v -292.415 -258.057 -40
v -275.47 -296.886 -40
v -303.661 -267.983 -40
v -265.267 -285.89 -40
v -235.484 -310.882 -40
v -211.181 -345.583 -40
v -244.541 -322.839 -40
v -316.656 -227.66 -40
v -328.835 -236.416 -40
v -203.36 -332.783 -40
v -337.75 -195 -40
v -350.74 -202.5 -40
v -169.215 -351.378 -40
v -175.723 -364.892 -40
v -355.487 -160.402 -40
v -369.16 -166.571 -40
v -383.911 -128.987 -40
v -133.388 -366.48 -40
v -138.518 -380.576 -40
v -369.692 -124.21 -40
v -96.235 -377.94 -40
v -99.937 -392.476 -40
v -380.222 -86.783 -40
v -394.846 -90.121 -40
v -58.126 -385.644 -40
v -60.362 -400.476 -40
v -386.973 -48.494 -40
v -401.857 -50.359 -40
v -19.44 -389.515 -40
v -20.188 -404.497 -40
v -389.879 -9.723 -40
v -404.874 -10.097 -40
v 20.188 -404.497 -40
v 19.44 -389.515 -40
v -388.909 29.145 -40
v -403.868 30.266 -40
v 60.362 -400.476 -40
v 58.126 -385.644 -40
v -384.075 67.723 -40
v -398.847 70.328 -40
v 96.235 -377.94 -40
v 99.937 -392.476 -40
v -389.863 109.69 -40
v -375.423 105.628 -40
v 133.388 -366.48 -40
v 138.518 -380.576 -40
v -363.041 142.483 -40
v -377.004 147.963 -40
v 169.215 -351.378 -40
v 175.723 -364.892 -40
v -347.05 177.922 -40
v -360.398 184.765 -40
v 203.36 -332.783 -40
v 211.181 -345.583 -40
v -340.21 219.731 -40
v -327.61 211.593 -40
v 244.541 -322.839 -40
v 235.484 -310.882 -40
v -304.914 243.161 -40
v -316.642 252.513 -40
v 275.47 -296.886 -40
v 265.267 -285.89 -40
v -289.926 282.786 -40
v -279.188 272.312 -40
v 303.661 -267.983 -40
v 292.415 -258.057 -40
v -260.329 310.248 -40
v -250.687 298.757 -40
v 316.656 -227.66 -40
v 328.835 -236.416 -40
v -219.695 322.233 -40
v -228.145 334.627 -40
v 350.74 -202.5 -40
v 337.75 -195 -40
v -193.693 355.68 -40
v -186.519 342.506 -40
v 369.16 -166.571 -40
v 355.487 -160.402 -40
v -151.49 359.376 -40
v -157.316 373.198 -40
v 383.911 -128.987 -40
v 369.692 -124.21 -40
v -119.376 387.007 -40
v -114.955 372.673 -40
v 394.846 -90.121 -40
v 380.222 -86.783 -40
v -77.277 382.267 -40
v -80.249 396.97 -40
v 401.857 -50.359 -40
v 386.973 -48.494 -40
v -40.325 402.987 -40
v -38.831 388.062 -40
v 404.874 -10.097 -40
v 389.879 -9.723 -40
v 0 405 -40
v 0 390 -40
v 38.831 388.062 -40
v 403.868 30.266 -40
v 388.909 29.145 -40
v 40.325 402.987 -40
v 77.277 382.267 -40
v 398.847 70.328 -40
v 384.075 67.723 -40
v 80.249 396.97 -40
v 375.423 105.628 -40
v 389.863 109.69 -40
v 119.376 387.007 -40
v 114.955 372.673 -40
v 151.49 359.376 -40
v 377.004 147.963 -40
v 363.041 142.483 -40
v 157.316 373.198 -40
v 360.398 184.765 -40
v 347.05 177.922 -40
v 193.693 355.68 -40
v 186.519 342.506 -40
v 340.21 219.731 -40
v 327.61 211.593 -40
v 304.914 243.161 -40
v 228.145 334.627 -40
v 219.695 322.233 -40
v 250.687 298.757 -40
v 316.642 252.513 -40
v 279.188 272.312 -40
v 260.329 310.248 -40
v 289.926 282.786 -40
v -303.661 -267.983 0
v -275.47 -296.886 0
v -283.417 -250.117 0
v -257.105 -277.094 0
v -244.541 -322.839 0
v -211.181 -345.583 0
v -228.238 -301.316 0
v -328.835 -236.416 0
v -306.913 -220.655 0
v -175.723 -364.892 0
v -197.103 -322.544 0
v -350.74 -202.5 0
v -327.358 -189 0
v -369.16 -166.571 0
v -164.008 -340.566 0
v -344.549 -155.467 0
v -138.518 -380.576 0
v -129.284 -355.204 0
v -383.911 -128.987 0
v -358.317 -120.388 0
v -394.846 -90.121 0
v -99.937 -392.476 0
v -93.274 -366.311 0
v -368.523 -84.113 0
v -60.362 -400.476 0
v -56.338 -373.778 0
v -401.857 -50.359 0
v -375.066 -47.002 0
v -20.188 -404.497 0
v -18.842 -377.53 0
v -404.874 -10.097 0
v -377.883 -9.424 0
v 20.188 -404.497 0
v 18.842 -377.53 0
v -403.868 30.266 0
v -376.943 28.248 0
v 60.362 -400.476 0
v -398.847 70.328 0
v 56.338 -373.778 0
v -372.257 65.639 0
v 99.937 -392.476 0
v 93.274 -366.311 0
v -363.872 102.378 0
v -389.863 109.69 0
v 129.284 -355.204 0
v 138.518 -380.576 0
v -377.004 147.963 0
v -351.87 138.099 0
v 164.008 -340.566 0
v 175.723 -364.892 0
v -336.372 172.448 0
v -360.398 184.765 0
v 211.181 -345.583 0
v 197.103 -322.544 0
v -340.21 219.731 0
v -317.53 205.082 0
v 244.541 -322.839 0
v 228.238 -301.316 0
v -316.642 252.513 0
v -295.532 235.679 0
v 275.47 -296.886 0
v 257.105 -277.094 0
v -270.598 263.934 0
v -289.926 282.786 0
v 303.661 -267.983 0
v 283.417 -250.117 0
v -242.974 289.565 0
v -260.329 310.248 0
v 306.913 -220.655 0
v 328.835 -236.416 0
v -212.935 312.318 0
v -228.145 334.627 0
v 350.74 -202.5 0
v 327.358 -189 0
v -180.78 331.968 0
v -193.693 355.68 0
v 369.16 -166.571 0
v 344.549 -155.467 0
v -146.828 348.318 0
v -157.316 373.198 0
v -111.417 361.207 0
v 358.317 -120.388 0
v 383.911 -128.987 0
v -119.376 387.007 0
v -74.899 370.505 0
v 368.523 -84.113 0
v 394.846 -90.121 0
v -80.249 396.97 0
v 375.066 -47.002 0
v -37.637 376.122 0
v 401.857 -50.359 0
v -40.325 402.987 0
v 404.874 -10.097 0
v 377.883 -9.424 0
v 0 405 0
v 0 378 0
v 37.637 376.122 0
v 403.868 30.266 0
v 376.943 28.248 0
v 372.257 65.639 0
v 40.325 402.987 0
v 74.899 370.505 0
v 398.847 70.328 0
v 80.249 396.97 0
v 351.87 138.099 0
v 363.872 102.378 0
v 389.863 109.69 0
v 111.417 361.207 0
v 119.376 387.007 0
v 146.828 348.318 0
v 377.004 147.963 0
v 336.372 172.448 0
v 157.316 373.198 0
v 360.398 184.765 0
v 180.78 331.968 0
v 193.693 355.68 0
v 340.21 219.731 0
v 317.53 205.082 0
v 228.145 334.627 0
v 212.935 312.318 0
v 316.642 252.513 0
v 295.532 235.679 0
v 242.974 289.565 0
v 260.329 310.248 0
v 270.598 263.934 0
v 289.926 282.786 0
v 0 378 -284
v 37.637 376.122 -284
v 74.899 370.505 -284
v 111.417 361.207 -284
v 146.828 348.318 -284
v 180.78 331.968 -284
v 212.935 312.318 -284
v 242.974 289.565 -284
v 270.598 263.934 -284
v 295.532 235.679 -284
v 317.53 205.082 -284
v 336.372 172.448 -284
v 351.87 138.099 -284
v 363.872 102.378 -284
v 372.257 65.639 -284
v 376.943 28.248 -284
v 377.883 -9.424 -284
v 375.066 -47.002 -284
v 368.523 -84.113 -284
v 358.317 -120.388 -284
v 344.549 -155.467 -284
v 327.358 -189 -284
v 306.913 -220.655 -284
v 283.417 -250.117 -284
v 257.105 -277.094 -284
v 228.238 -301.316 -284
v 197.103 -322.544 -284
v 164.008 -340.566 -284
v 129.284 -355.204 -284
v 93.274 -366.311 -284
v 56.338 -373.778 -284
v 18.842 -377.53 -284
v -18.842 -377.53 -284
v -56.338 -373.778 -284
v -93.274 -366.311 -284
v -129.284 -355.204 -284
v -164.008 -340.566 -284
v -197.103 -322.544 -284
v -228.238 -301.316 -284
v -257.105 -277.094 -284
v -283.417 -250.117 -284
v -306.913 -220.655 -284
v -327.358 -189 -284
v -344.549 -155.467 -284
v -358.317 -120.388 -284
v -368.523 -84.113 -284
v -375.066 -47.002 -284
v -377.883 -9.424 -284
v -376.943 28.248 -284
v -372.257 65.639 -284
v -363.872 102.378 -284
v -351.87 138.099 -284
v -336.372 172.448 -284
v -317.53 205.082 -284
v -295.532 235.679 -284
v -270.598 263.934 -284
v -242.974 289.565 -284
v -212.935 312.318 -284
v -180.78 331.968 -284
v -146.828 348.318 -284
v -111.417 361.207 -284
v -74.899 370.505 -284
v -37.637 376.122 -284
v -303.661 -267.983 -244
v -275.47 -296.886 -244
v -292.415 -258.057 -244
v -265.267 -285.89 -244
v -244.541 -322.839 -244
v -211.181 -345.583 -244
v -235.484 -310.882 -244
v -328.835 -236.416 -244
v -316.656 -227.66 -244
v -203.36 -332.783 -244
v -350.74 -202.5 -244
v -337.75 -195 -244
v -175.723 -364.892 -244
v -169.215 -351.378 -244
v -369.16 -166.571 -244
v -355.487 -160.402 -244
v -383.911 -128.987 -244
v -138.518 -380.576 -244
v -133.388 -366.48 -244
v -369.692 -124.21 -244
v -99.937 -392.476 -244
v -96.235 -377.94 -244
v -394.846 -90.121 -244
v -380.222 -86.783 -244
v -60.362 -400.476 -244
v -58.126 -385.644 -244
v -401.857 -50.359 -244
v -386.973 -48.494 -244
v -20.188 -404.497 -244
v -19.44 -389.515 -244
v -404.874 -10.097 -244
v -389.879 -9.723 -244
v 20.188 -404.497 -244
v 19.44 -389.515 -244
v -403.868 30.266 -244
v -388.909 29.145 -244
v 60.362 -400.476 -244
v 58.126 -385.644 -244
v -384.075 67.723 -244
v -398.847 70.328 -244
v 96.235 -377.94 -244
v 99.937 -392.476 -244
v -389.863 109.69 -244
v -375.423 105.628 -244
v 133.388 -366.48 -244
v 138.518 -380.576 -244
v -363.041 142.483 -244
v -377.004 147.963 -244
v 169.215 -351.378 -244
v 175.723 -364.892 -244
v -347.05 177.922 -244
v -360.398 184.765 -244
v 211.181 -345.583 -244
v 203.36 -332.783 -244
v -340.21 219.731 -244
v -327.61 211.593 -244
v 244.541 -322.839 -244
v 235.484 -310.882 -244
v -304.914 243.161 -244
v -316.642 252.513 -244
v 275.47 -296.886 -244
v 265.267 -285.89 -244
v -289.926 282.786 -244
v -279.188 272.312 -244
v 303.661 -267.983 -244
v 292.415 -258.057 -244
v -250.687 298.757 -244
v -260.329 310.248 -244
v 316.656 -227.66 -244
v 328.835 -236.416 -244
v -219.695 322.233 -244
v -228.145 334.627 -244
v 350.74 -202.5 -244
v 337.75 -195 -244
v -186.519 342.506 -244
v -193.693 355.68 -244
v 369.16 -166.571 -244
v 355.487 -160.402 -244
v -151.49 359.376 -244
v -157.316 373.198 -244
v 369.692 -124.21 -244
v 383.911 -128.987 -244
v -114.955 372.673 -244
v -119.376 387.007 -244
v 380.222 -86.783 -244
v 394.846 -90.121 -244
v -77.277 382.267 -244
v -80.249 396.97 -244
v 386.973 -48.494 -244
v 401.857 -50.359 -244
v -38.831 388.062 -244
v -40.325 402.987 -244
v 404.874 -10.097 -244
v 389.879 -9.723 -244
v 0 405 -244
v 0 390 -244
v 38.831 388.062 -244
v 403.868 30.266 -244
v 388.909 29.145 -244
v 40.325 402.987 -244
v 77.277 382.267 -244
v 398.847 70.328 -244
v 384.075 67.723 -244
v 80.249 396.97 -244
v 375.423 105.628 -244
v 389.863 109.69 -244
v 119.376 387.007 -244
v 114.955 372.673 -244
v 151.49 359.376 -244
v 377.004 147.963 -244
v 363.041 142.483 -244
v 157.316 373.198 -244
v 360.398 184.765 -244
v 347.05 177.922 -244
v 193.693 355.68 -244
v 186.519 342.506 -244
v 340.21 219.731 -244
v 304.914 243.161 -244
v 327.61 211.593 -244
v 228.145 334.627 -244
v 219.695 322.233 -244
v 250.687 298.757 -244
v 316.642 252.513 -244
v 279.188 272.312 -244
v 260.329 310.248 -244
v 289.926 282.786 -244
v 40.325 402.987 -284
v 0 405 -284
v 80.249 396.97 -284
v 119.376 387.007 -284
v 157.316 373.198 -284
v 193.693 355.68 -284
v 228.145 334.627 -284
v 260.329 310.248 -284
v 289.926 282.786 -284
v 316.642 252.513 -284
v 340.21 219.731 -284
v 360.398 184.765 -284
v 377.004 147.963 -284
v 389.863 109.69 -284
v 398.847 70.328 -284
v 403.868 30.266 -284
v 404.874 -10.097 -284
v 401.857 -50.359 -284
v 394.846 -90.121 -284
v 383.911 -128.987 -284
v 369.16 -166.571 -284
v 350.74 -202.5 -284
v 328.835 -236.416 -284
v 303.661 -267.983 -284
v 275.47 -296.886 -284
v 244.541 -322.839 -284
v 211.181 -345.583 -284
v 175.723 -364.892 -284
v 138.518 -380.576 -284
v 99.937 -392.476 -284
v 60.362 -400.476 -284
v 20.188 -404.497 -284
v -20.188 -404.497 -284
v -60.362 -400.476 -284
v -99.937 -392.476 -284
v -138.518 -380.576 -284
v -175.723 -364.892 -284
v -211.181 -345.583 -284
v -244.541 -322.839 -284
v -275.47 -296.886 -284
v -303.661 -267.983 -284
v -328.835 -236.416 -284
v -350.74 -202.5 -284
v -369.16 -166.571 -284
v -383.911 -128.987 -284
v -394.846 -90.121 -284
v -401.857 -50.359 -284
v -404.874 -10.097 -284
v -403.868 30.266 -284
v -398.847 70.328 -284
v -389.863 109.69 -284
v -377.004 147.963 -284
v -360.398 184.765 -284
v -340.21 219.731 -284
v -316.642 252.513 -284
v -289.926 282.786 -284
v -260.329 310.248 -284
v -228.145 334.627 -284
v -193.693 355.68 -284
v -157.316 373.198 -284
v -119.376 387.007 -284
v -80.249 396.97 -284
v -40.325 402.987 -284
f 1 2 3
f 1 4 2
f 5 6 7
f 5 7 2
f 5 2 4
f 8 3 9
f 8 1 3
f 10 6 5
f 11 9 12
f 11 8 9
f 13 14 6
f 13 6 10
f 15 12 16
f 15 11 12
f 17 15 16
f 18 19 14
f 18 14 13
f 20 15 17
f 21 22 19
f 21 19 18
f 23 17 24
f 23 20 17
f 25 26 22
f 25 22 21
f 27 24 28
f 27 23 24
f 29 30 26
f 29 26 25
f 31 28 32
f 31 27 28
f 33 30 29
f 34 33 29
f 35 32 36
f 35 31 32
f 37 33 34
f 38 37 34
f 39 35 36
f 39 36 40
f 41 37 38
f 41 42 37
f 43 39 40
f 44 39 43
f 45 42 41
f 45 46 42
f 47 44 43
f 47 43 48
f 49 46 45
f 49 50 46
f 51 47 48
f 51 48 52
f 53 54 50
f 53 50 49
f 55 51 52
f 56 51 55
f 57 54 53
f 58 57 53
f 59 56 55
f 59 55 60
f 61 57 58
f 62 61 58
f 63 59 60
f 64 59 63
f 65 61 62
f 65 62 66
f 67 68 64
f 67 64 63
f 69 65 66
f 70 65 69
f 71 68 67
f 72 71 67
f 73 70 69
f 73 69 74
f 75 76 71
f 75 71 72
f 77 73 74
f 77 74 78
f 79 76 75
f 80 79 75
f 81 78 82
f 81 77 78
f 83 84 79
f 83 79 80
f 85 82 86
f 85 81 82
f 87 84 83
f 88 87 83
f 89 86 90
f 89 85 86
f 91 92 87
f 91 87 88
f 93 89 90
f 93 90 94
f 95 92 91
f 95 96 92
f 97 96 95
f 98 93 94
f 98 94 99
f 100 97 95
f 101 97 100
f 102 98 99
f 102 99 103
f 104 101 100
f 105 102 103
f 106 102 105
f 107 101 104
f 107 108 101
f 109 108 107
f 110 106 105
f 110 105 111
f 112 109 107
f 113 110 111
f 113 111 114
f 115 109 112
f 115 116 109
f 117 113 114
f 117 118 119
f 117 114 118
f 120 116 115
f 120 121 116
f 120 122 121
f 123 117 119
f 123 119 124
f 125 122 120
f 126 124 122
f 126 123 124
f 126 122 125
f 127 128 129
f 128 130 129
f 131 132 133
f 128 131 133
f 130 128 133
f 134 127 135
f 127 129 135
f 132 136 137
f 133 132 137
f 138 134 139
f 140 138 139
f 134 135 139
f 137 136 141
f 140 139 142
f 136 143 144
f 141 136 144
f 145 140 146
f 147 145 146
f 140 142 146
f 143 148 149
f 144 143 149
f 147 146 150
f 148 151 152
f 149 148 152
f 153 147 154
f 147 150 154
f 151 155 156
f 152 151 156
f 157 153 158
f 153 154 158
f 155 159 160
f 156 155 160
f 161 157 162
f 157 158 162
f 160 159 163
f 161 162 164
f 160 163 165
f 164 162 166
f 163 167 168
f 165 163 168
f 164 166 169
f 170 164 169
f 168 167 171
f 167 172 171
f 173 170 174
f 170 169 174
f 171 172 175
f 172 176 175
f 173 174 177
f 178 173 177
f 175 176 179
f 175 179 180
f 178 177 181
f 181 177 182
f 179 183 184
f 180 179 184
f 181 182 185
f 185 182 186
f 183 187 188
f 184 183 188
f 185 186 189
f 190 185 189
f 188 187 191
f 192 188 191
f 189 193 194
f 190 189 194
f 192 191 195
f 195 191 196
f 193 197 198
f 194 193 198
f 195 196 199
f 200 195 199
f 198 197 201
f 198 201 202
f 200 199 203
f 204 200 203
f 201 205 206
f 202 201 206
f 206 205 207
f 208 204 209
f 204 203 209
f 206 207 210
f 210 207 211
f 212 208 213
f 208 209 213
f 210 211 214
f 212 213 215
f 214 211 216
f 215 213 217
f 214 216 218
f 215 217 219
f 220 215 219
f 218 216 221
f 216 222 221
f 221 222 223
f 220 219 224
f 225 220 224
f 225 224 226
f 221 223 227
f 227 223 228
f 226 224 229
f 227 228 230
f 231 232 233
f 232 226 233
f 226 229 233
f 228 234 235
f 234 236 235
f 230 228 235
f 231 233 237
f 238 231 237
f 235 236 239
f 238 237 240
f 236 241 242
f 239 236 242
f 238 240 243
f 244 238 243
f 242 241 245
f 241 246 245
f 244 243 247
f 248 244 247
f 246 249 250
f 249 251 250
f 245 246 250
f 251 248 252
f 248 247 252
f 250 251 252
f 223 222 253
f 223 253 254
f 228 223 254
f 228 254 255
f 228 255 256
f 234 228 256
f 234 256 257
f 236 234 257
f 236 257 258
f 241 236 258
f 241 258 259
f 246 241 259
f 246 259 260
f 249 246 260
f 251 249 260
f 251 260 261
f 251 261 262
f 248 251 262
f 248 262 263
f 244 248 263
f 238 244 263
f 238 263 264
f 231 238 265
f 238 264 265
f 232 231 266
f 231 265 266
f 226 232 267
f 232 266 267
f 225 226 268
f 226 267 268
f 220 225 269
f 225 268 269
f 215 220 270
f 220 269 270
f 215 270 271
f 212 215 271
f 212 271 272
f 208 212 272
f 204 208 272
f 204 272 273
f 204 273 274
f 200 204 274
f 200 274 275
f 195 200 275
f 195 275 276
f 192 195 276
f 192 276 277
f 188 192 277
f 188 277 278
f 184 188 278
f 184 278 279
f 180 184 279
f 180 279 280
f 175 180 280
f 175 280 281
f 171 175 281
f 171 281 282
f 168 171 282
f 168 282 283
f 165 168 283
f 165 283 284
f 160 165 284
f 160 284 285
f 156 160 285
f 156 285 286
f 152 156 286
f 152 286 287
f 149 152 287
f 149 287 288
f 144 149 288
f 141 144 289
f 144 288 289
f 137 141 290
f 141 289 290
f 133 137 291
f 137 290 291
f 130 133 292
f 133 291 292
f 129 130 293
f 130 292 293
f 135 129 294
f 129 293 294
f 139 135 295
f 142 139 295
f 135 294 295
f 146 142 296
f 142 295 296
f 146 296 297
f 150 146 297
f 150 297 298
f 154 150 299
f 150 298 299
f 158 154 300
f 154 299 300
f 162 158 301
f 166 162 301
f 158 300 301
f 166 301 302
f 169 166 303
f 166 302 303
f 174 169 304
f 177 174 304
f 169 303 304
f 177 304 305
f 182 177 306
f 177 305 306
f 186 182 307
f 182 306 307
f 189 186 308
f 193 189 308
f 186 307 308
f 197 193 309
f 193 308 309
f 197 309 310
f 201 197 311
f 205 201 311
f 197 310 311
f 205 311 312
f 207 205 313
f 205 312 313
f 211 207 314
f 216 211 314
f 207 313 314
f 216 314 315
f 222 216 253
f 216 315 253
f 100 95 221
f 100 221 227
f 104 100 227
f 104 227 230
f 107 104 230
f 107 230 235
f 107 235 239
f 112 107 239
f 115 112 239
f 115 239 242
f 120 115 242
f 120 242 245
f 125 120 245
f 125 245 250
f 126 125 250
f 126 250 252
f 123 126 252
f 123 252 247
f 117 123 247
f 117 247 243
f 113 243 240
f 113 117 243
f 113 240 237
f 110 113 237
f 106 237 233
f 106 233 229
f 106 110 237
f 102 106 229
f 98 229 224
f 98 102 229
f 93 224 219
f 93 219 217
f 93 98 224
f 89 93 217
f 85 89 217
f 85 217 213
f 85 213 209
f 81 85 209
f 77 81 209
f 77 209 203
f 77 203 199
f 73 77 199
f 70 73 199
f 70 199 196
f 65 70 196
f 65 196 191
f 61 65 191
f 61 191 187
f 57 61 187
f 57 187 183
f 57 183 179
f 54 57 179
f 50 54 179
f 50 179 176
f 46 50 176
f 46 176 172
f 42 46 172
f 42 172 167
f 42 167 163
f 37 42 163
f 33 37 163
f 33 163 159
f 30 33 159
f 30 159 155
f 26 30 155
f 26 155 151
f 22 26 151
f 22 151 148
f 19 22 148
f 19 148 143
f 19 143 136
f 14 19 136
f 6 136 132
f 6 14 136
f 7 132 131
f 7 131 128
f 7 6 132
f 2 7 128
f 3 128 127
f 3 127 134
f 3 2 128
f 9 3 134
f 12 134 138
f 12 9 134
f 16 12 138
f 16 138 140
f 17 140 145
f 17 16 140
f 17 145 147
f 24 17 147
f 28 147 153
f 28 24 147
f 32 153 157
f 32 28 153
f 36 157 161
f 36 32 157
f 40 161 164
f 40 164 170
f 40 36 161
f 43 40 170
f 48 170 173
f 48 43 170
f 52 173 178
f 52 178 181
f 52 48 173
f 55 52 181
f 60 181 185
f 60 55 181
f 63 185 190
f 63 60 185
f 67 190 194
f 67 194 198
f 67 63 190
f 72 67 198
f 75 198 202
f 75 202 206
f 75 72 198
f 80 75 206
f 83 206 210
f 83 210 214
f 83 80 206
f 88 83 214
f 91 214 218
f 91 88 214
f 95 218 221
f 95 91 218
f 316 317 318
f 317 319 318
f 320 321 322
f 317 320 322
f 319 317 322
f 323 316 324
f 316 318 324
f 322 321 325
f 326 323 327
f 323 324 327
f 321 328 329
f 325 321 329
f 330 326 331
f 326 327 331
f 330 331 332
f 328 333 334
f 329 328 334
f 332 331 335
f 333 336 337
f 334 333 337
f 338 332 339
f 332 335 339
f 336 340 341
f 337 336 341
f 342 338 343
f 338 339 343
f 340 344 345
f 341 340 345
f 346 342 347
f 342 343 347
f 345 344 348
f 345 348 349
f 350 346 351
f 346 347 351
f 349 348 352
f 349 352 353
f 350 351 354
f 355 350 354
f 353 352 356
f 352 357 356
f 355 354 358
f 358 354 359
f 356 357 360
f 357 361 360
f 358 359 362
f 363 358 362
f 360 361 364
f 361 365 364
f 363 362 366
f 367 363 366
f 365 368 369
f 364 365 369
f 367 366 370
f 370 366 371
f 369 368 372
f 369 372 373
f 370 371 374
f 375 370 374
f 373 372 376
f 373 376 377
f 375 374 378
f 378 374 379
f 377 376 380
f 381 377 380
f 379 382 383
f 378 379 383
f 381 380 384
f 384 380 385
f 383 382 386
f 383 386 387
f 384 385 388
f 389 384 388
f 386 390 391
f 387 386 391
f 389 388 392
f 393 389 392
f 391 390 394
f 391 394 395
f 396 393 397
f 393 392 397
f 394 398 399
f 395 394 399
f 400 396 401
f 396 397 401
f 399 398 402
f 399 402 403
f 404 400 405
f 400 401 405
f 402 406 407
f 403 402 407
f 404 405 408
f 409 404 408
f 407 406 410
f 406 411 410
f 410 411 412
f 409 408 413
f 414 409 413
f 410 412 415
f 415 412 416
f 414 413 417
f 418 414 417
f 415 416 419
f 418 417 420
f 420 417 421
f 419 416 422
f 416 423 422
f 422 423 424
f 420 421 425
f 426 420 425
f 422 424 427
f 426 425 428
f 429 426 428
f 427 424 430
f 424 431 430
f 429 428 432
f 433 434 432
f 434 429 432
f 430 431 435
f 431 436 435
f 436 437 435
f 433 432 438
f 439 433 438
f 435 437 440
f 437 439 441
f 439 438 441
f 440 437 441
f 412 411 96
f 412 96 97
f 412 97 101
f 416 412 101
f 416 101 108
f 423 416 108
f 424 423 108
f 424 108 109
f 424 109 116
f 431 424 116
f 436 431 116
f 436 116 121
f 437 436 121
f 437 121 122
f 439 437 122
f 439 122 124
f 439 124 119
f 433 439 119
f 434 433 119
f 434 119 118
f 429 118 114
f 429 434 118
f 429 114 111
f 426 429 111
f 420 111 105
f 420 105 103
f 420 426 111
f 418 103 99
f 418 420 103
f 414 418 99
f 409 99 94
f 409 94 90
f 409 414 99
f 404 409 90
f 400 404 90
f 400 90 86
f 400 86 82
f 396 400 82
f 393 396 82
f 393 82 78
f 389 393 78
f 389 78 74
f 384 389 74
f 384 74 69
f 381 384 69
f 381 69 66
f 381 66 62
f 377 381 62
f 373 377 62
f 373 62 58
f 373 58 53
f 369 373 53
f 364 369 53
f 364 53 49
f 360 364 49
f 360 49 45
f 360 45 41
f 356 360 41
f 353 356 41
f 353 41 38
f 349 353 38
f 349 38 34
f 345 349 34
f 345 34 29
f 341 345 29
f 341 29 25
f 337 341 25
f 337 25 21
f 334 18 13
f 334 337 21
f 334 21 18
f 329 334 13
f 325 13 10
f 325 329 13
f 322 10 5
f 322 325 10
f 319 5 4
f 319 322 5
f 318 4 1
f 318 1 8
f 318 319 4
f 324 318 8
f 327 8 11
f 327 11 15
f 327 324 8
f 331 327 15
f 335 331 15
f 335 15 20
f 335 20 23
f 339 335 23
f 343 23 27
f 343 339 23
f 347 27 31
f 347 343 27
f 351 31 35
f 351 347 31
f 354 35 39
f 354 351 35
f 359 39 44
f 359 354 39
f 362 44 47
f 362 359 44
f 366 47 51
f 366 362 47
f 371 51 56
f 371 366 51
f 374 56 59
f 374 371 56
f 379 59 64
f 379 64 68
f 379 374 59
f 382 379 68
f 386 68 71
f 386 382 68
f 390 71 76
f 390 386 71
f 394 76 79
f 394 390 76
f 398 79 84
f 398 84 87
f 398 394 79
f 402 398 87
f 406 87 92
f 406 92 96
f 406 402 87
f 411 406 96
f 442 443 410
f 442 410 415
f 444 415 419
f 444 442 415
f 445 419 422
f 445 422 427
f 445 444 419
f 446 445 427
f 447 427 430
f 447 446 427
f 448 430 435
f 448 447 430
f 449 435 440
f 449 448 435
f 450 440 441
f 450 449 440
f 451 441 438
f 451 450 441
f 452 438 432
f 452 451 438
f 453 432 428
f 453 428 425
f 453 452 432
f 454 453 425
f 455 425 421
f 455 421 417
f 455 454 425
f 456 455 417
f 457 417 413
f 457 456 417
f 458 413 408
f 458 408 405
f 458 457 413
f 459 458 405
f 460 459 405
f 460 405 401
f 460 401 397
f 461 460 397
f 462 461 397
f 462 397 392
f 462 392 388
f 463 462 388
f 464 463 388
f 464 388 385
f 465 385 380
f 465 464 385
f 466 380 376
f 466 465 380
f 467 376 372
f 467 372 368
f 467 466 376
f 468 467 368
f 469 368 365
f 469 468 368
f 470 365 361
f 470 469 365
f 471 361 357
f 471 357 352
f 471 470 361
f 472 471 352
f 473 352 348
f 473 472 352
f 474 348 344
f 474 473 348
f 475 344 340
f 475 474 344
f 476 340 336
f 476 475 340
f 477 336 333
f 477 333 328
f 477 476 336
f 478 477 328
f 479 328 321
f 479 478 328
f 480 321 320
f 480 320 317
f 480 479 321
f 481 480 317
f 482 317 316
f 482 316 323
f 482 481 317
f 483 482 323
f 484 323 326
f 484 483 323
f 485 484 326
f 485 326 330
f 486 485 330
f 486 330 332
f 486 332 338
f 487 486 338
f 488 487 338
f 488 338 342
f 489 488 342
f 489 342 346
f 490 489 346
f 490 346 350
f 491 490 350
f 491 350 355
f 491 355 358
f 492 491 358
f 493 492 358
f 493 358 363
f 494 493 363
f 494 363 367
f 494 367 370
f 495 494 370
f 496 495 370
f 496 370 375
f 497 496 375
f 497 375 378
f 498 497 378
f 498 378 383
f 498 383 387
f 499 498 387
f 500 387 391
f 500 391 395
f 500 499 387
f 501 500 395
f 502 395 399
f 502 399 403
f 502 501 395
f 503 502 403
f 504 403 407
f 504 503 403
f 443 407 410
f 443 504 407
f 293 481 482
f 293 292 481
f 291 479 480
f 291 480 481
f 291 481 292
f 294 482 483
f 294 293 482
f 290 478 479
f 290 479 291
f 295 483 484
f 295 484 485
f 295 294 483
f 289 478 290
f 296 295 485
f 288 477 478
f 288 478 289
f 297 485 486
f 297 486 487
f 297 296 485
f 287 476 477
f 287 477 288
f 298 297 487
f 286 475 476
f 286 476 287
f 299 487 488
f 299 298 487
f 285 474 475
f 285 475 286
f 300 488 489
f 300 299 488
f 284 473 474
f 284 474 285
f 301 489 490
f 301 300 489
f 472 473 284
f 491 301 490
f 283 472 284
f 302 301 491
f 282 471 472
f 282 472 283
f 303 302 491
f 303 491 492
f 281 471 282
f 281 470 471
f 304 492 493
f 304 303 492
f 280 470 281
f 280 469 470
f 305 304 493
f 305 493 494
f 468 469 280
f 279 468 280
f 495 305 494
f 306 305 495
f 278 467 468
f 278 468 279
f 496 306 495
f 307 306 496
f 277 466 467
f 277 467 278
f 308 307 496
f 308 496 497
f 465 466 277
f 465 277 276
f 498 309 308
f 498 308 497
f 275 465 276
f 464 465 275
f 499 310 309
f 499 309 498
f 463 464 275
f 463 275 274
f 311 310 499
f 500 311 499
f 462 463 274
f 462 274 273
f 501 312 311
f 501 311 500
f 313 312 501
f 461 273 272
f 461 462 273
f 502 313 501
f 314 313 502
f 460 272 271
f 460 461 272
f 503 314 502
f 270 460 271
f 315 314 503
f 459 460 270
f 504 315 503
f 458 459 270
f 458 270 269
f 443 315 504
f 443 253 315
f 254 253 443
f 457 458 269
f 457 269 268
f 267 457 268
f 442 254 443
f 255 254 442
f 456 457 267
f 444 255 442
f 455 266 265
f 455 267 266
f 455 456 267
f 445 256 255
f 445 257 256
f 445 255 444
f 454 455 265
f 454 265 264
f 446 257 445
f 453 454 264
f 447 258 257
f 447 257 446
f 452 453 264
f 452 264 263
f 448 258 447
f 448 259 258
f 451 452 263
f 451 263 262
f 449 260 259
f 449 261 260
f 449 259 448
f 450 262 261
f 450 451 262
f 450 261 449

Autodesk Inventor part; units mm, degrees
ref_plane "YZ Plane" through (0, 0, 0) normal (1, 0, 0) x (0, 1, 0)
ref_plane "XZ Plane" through (0, 0, 0) normal (0, 1, 0) x (-1, 0, 0)
ref_plane "XY Plane" through (0, 0, 0) normal (0, 0, 1) x (1, 0, 0)
sketch "Sketch1" plane through (0, 0, 0) normal (1, 0, 0) x (0, 1, 0)
  line L0 (0, 0) -> (0, -284)
  line L1 (0, 0) -> (378, 0)
  line L2 (378, 0) -> (378, -284)
  line L3 (378, -284) -> (0, -284)
  line L4 (378, 0) -> (405, 0)
  line L5 (405, 0) -> (405, -40)
  line L6 (405, -40) -> (390, -40)
  line L7 (390, -40) -> (390, -244)
  line L8 (390, -244) -> (405, -244)
  line L9 (405, -244) -> (405, -284)
  line L10 (378, -284) -> (405, -284)
  dimension "d0" = 756
  dimension "d1" = 780
  dimension "d2" = 810
  dimension "d3" = 40
  dimension "d4" = 40
  dimension "d5" = 284
revolve "Revolution1" add sketch "Sketch1" angle 360 about axis through (0, 0, 0) along (0, 0, -1) contours L4 L5 L6 L7 L8 L9 L10 L2
properties part number "DiscoCorpoTurbina4" material "Steel, Alloy"
